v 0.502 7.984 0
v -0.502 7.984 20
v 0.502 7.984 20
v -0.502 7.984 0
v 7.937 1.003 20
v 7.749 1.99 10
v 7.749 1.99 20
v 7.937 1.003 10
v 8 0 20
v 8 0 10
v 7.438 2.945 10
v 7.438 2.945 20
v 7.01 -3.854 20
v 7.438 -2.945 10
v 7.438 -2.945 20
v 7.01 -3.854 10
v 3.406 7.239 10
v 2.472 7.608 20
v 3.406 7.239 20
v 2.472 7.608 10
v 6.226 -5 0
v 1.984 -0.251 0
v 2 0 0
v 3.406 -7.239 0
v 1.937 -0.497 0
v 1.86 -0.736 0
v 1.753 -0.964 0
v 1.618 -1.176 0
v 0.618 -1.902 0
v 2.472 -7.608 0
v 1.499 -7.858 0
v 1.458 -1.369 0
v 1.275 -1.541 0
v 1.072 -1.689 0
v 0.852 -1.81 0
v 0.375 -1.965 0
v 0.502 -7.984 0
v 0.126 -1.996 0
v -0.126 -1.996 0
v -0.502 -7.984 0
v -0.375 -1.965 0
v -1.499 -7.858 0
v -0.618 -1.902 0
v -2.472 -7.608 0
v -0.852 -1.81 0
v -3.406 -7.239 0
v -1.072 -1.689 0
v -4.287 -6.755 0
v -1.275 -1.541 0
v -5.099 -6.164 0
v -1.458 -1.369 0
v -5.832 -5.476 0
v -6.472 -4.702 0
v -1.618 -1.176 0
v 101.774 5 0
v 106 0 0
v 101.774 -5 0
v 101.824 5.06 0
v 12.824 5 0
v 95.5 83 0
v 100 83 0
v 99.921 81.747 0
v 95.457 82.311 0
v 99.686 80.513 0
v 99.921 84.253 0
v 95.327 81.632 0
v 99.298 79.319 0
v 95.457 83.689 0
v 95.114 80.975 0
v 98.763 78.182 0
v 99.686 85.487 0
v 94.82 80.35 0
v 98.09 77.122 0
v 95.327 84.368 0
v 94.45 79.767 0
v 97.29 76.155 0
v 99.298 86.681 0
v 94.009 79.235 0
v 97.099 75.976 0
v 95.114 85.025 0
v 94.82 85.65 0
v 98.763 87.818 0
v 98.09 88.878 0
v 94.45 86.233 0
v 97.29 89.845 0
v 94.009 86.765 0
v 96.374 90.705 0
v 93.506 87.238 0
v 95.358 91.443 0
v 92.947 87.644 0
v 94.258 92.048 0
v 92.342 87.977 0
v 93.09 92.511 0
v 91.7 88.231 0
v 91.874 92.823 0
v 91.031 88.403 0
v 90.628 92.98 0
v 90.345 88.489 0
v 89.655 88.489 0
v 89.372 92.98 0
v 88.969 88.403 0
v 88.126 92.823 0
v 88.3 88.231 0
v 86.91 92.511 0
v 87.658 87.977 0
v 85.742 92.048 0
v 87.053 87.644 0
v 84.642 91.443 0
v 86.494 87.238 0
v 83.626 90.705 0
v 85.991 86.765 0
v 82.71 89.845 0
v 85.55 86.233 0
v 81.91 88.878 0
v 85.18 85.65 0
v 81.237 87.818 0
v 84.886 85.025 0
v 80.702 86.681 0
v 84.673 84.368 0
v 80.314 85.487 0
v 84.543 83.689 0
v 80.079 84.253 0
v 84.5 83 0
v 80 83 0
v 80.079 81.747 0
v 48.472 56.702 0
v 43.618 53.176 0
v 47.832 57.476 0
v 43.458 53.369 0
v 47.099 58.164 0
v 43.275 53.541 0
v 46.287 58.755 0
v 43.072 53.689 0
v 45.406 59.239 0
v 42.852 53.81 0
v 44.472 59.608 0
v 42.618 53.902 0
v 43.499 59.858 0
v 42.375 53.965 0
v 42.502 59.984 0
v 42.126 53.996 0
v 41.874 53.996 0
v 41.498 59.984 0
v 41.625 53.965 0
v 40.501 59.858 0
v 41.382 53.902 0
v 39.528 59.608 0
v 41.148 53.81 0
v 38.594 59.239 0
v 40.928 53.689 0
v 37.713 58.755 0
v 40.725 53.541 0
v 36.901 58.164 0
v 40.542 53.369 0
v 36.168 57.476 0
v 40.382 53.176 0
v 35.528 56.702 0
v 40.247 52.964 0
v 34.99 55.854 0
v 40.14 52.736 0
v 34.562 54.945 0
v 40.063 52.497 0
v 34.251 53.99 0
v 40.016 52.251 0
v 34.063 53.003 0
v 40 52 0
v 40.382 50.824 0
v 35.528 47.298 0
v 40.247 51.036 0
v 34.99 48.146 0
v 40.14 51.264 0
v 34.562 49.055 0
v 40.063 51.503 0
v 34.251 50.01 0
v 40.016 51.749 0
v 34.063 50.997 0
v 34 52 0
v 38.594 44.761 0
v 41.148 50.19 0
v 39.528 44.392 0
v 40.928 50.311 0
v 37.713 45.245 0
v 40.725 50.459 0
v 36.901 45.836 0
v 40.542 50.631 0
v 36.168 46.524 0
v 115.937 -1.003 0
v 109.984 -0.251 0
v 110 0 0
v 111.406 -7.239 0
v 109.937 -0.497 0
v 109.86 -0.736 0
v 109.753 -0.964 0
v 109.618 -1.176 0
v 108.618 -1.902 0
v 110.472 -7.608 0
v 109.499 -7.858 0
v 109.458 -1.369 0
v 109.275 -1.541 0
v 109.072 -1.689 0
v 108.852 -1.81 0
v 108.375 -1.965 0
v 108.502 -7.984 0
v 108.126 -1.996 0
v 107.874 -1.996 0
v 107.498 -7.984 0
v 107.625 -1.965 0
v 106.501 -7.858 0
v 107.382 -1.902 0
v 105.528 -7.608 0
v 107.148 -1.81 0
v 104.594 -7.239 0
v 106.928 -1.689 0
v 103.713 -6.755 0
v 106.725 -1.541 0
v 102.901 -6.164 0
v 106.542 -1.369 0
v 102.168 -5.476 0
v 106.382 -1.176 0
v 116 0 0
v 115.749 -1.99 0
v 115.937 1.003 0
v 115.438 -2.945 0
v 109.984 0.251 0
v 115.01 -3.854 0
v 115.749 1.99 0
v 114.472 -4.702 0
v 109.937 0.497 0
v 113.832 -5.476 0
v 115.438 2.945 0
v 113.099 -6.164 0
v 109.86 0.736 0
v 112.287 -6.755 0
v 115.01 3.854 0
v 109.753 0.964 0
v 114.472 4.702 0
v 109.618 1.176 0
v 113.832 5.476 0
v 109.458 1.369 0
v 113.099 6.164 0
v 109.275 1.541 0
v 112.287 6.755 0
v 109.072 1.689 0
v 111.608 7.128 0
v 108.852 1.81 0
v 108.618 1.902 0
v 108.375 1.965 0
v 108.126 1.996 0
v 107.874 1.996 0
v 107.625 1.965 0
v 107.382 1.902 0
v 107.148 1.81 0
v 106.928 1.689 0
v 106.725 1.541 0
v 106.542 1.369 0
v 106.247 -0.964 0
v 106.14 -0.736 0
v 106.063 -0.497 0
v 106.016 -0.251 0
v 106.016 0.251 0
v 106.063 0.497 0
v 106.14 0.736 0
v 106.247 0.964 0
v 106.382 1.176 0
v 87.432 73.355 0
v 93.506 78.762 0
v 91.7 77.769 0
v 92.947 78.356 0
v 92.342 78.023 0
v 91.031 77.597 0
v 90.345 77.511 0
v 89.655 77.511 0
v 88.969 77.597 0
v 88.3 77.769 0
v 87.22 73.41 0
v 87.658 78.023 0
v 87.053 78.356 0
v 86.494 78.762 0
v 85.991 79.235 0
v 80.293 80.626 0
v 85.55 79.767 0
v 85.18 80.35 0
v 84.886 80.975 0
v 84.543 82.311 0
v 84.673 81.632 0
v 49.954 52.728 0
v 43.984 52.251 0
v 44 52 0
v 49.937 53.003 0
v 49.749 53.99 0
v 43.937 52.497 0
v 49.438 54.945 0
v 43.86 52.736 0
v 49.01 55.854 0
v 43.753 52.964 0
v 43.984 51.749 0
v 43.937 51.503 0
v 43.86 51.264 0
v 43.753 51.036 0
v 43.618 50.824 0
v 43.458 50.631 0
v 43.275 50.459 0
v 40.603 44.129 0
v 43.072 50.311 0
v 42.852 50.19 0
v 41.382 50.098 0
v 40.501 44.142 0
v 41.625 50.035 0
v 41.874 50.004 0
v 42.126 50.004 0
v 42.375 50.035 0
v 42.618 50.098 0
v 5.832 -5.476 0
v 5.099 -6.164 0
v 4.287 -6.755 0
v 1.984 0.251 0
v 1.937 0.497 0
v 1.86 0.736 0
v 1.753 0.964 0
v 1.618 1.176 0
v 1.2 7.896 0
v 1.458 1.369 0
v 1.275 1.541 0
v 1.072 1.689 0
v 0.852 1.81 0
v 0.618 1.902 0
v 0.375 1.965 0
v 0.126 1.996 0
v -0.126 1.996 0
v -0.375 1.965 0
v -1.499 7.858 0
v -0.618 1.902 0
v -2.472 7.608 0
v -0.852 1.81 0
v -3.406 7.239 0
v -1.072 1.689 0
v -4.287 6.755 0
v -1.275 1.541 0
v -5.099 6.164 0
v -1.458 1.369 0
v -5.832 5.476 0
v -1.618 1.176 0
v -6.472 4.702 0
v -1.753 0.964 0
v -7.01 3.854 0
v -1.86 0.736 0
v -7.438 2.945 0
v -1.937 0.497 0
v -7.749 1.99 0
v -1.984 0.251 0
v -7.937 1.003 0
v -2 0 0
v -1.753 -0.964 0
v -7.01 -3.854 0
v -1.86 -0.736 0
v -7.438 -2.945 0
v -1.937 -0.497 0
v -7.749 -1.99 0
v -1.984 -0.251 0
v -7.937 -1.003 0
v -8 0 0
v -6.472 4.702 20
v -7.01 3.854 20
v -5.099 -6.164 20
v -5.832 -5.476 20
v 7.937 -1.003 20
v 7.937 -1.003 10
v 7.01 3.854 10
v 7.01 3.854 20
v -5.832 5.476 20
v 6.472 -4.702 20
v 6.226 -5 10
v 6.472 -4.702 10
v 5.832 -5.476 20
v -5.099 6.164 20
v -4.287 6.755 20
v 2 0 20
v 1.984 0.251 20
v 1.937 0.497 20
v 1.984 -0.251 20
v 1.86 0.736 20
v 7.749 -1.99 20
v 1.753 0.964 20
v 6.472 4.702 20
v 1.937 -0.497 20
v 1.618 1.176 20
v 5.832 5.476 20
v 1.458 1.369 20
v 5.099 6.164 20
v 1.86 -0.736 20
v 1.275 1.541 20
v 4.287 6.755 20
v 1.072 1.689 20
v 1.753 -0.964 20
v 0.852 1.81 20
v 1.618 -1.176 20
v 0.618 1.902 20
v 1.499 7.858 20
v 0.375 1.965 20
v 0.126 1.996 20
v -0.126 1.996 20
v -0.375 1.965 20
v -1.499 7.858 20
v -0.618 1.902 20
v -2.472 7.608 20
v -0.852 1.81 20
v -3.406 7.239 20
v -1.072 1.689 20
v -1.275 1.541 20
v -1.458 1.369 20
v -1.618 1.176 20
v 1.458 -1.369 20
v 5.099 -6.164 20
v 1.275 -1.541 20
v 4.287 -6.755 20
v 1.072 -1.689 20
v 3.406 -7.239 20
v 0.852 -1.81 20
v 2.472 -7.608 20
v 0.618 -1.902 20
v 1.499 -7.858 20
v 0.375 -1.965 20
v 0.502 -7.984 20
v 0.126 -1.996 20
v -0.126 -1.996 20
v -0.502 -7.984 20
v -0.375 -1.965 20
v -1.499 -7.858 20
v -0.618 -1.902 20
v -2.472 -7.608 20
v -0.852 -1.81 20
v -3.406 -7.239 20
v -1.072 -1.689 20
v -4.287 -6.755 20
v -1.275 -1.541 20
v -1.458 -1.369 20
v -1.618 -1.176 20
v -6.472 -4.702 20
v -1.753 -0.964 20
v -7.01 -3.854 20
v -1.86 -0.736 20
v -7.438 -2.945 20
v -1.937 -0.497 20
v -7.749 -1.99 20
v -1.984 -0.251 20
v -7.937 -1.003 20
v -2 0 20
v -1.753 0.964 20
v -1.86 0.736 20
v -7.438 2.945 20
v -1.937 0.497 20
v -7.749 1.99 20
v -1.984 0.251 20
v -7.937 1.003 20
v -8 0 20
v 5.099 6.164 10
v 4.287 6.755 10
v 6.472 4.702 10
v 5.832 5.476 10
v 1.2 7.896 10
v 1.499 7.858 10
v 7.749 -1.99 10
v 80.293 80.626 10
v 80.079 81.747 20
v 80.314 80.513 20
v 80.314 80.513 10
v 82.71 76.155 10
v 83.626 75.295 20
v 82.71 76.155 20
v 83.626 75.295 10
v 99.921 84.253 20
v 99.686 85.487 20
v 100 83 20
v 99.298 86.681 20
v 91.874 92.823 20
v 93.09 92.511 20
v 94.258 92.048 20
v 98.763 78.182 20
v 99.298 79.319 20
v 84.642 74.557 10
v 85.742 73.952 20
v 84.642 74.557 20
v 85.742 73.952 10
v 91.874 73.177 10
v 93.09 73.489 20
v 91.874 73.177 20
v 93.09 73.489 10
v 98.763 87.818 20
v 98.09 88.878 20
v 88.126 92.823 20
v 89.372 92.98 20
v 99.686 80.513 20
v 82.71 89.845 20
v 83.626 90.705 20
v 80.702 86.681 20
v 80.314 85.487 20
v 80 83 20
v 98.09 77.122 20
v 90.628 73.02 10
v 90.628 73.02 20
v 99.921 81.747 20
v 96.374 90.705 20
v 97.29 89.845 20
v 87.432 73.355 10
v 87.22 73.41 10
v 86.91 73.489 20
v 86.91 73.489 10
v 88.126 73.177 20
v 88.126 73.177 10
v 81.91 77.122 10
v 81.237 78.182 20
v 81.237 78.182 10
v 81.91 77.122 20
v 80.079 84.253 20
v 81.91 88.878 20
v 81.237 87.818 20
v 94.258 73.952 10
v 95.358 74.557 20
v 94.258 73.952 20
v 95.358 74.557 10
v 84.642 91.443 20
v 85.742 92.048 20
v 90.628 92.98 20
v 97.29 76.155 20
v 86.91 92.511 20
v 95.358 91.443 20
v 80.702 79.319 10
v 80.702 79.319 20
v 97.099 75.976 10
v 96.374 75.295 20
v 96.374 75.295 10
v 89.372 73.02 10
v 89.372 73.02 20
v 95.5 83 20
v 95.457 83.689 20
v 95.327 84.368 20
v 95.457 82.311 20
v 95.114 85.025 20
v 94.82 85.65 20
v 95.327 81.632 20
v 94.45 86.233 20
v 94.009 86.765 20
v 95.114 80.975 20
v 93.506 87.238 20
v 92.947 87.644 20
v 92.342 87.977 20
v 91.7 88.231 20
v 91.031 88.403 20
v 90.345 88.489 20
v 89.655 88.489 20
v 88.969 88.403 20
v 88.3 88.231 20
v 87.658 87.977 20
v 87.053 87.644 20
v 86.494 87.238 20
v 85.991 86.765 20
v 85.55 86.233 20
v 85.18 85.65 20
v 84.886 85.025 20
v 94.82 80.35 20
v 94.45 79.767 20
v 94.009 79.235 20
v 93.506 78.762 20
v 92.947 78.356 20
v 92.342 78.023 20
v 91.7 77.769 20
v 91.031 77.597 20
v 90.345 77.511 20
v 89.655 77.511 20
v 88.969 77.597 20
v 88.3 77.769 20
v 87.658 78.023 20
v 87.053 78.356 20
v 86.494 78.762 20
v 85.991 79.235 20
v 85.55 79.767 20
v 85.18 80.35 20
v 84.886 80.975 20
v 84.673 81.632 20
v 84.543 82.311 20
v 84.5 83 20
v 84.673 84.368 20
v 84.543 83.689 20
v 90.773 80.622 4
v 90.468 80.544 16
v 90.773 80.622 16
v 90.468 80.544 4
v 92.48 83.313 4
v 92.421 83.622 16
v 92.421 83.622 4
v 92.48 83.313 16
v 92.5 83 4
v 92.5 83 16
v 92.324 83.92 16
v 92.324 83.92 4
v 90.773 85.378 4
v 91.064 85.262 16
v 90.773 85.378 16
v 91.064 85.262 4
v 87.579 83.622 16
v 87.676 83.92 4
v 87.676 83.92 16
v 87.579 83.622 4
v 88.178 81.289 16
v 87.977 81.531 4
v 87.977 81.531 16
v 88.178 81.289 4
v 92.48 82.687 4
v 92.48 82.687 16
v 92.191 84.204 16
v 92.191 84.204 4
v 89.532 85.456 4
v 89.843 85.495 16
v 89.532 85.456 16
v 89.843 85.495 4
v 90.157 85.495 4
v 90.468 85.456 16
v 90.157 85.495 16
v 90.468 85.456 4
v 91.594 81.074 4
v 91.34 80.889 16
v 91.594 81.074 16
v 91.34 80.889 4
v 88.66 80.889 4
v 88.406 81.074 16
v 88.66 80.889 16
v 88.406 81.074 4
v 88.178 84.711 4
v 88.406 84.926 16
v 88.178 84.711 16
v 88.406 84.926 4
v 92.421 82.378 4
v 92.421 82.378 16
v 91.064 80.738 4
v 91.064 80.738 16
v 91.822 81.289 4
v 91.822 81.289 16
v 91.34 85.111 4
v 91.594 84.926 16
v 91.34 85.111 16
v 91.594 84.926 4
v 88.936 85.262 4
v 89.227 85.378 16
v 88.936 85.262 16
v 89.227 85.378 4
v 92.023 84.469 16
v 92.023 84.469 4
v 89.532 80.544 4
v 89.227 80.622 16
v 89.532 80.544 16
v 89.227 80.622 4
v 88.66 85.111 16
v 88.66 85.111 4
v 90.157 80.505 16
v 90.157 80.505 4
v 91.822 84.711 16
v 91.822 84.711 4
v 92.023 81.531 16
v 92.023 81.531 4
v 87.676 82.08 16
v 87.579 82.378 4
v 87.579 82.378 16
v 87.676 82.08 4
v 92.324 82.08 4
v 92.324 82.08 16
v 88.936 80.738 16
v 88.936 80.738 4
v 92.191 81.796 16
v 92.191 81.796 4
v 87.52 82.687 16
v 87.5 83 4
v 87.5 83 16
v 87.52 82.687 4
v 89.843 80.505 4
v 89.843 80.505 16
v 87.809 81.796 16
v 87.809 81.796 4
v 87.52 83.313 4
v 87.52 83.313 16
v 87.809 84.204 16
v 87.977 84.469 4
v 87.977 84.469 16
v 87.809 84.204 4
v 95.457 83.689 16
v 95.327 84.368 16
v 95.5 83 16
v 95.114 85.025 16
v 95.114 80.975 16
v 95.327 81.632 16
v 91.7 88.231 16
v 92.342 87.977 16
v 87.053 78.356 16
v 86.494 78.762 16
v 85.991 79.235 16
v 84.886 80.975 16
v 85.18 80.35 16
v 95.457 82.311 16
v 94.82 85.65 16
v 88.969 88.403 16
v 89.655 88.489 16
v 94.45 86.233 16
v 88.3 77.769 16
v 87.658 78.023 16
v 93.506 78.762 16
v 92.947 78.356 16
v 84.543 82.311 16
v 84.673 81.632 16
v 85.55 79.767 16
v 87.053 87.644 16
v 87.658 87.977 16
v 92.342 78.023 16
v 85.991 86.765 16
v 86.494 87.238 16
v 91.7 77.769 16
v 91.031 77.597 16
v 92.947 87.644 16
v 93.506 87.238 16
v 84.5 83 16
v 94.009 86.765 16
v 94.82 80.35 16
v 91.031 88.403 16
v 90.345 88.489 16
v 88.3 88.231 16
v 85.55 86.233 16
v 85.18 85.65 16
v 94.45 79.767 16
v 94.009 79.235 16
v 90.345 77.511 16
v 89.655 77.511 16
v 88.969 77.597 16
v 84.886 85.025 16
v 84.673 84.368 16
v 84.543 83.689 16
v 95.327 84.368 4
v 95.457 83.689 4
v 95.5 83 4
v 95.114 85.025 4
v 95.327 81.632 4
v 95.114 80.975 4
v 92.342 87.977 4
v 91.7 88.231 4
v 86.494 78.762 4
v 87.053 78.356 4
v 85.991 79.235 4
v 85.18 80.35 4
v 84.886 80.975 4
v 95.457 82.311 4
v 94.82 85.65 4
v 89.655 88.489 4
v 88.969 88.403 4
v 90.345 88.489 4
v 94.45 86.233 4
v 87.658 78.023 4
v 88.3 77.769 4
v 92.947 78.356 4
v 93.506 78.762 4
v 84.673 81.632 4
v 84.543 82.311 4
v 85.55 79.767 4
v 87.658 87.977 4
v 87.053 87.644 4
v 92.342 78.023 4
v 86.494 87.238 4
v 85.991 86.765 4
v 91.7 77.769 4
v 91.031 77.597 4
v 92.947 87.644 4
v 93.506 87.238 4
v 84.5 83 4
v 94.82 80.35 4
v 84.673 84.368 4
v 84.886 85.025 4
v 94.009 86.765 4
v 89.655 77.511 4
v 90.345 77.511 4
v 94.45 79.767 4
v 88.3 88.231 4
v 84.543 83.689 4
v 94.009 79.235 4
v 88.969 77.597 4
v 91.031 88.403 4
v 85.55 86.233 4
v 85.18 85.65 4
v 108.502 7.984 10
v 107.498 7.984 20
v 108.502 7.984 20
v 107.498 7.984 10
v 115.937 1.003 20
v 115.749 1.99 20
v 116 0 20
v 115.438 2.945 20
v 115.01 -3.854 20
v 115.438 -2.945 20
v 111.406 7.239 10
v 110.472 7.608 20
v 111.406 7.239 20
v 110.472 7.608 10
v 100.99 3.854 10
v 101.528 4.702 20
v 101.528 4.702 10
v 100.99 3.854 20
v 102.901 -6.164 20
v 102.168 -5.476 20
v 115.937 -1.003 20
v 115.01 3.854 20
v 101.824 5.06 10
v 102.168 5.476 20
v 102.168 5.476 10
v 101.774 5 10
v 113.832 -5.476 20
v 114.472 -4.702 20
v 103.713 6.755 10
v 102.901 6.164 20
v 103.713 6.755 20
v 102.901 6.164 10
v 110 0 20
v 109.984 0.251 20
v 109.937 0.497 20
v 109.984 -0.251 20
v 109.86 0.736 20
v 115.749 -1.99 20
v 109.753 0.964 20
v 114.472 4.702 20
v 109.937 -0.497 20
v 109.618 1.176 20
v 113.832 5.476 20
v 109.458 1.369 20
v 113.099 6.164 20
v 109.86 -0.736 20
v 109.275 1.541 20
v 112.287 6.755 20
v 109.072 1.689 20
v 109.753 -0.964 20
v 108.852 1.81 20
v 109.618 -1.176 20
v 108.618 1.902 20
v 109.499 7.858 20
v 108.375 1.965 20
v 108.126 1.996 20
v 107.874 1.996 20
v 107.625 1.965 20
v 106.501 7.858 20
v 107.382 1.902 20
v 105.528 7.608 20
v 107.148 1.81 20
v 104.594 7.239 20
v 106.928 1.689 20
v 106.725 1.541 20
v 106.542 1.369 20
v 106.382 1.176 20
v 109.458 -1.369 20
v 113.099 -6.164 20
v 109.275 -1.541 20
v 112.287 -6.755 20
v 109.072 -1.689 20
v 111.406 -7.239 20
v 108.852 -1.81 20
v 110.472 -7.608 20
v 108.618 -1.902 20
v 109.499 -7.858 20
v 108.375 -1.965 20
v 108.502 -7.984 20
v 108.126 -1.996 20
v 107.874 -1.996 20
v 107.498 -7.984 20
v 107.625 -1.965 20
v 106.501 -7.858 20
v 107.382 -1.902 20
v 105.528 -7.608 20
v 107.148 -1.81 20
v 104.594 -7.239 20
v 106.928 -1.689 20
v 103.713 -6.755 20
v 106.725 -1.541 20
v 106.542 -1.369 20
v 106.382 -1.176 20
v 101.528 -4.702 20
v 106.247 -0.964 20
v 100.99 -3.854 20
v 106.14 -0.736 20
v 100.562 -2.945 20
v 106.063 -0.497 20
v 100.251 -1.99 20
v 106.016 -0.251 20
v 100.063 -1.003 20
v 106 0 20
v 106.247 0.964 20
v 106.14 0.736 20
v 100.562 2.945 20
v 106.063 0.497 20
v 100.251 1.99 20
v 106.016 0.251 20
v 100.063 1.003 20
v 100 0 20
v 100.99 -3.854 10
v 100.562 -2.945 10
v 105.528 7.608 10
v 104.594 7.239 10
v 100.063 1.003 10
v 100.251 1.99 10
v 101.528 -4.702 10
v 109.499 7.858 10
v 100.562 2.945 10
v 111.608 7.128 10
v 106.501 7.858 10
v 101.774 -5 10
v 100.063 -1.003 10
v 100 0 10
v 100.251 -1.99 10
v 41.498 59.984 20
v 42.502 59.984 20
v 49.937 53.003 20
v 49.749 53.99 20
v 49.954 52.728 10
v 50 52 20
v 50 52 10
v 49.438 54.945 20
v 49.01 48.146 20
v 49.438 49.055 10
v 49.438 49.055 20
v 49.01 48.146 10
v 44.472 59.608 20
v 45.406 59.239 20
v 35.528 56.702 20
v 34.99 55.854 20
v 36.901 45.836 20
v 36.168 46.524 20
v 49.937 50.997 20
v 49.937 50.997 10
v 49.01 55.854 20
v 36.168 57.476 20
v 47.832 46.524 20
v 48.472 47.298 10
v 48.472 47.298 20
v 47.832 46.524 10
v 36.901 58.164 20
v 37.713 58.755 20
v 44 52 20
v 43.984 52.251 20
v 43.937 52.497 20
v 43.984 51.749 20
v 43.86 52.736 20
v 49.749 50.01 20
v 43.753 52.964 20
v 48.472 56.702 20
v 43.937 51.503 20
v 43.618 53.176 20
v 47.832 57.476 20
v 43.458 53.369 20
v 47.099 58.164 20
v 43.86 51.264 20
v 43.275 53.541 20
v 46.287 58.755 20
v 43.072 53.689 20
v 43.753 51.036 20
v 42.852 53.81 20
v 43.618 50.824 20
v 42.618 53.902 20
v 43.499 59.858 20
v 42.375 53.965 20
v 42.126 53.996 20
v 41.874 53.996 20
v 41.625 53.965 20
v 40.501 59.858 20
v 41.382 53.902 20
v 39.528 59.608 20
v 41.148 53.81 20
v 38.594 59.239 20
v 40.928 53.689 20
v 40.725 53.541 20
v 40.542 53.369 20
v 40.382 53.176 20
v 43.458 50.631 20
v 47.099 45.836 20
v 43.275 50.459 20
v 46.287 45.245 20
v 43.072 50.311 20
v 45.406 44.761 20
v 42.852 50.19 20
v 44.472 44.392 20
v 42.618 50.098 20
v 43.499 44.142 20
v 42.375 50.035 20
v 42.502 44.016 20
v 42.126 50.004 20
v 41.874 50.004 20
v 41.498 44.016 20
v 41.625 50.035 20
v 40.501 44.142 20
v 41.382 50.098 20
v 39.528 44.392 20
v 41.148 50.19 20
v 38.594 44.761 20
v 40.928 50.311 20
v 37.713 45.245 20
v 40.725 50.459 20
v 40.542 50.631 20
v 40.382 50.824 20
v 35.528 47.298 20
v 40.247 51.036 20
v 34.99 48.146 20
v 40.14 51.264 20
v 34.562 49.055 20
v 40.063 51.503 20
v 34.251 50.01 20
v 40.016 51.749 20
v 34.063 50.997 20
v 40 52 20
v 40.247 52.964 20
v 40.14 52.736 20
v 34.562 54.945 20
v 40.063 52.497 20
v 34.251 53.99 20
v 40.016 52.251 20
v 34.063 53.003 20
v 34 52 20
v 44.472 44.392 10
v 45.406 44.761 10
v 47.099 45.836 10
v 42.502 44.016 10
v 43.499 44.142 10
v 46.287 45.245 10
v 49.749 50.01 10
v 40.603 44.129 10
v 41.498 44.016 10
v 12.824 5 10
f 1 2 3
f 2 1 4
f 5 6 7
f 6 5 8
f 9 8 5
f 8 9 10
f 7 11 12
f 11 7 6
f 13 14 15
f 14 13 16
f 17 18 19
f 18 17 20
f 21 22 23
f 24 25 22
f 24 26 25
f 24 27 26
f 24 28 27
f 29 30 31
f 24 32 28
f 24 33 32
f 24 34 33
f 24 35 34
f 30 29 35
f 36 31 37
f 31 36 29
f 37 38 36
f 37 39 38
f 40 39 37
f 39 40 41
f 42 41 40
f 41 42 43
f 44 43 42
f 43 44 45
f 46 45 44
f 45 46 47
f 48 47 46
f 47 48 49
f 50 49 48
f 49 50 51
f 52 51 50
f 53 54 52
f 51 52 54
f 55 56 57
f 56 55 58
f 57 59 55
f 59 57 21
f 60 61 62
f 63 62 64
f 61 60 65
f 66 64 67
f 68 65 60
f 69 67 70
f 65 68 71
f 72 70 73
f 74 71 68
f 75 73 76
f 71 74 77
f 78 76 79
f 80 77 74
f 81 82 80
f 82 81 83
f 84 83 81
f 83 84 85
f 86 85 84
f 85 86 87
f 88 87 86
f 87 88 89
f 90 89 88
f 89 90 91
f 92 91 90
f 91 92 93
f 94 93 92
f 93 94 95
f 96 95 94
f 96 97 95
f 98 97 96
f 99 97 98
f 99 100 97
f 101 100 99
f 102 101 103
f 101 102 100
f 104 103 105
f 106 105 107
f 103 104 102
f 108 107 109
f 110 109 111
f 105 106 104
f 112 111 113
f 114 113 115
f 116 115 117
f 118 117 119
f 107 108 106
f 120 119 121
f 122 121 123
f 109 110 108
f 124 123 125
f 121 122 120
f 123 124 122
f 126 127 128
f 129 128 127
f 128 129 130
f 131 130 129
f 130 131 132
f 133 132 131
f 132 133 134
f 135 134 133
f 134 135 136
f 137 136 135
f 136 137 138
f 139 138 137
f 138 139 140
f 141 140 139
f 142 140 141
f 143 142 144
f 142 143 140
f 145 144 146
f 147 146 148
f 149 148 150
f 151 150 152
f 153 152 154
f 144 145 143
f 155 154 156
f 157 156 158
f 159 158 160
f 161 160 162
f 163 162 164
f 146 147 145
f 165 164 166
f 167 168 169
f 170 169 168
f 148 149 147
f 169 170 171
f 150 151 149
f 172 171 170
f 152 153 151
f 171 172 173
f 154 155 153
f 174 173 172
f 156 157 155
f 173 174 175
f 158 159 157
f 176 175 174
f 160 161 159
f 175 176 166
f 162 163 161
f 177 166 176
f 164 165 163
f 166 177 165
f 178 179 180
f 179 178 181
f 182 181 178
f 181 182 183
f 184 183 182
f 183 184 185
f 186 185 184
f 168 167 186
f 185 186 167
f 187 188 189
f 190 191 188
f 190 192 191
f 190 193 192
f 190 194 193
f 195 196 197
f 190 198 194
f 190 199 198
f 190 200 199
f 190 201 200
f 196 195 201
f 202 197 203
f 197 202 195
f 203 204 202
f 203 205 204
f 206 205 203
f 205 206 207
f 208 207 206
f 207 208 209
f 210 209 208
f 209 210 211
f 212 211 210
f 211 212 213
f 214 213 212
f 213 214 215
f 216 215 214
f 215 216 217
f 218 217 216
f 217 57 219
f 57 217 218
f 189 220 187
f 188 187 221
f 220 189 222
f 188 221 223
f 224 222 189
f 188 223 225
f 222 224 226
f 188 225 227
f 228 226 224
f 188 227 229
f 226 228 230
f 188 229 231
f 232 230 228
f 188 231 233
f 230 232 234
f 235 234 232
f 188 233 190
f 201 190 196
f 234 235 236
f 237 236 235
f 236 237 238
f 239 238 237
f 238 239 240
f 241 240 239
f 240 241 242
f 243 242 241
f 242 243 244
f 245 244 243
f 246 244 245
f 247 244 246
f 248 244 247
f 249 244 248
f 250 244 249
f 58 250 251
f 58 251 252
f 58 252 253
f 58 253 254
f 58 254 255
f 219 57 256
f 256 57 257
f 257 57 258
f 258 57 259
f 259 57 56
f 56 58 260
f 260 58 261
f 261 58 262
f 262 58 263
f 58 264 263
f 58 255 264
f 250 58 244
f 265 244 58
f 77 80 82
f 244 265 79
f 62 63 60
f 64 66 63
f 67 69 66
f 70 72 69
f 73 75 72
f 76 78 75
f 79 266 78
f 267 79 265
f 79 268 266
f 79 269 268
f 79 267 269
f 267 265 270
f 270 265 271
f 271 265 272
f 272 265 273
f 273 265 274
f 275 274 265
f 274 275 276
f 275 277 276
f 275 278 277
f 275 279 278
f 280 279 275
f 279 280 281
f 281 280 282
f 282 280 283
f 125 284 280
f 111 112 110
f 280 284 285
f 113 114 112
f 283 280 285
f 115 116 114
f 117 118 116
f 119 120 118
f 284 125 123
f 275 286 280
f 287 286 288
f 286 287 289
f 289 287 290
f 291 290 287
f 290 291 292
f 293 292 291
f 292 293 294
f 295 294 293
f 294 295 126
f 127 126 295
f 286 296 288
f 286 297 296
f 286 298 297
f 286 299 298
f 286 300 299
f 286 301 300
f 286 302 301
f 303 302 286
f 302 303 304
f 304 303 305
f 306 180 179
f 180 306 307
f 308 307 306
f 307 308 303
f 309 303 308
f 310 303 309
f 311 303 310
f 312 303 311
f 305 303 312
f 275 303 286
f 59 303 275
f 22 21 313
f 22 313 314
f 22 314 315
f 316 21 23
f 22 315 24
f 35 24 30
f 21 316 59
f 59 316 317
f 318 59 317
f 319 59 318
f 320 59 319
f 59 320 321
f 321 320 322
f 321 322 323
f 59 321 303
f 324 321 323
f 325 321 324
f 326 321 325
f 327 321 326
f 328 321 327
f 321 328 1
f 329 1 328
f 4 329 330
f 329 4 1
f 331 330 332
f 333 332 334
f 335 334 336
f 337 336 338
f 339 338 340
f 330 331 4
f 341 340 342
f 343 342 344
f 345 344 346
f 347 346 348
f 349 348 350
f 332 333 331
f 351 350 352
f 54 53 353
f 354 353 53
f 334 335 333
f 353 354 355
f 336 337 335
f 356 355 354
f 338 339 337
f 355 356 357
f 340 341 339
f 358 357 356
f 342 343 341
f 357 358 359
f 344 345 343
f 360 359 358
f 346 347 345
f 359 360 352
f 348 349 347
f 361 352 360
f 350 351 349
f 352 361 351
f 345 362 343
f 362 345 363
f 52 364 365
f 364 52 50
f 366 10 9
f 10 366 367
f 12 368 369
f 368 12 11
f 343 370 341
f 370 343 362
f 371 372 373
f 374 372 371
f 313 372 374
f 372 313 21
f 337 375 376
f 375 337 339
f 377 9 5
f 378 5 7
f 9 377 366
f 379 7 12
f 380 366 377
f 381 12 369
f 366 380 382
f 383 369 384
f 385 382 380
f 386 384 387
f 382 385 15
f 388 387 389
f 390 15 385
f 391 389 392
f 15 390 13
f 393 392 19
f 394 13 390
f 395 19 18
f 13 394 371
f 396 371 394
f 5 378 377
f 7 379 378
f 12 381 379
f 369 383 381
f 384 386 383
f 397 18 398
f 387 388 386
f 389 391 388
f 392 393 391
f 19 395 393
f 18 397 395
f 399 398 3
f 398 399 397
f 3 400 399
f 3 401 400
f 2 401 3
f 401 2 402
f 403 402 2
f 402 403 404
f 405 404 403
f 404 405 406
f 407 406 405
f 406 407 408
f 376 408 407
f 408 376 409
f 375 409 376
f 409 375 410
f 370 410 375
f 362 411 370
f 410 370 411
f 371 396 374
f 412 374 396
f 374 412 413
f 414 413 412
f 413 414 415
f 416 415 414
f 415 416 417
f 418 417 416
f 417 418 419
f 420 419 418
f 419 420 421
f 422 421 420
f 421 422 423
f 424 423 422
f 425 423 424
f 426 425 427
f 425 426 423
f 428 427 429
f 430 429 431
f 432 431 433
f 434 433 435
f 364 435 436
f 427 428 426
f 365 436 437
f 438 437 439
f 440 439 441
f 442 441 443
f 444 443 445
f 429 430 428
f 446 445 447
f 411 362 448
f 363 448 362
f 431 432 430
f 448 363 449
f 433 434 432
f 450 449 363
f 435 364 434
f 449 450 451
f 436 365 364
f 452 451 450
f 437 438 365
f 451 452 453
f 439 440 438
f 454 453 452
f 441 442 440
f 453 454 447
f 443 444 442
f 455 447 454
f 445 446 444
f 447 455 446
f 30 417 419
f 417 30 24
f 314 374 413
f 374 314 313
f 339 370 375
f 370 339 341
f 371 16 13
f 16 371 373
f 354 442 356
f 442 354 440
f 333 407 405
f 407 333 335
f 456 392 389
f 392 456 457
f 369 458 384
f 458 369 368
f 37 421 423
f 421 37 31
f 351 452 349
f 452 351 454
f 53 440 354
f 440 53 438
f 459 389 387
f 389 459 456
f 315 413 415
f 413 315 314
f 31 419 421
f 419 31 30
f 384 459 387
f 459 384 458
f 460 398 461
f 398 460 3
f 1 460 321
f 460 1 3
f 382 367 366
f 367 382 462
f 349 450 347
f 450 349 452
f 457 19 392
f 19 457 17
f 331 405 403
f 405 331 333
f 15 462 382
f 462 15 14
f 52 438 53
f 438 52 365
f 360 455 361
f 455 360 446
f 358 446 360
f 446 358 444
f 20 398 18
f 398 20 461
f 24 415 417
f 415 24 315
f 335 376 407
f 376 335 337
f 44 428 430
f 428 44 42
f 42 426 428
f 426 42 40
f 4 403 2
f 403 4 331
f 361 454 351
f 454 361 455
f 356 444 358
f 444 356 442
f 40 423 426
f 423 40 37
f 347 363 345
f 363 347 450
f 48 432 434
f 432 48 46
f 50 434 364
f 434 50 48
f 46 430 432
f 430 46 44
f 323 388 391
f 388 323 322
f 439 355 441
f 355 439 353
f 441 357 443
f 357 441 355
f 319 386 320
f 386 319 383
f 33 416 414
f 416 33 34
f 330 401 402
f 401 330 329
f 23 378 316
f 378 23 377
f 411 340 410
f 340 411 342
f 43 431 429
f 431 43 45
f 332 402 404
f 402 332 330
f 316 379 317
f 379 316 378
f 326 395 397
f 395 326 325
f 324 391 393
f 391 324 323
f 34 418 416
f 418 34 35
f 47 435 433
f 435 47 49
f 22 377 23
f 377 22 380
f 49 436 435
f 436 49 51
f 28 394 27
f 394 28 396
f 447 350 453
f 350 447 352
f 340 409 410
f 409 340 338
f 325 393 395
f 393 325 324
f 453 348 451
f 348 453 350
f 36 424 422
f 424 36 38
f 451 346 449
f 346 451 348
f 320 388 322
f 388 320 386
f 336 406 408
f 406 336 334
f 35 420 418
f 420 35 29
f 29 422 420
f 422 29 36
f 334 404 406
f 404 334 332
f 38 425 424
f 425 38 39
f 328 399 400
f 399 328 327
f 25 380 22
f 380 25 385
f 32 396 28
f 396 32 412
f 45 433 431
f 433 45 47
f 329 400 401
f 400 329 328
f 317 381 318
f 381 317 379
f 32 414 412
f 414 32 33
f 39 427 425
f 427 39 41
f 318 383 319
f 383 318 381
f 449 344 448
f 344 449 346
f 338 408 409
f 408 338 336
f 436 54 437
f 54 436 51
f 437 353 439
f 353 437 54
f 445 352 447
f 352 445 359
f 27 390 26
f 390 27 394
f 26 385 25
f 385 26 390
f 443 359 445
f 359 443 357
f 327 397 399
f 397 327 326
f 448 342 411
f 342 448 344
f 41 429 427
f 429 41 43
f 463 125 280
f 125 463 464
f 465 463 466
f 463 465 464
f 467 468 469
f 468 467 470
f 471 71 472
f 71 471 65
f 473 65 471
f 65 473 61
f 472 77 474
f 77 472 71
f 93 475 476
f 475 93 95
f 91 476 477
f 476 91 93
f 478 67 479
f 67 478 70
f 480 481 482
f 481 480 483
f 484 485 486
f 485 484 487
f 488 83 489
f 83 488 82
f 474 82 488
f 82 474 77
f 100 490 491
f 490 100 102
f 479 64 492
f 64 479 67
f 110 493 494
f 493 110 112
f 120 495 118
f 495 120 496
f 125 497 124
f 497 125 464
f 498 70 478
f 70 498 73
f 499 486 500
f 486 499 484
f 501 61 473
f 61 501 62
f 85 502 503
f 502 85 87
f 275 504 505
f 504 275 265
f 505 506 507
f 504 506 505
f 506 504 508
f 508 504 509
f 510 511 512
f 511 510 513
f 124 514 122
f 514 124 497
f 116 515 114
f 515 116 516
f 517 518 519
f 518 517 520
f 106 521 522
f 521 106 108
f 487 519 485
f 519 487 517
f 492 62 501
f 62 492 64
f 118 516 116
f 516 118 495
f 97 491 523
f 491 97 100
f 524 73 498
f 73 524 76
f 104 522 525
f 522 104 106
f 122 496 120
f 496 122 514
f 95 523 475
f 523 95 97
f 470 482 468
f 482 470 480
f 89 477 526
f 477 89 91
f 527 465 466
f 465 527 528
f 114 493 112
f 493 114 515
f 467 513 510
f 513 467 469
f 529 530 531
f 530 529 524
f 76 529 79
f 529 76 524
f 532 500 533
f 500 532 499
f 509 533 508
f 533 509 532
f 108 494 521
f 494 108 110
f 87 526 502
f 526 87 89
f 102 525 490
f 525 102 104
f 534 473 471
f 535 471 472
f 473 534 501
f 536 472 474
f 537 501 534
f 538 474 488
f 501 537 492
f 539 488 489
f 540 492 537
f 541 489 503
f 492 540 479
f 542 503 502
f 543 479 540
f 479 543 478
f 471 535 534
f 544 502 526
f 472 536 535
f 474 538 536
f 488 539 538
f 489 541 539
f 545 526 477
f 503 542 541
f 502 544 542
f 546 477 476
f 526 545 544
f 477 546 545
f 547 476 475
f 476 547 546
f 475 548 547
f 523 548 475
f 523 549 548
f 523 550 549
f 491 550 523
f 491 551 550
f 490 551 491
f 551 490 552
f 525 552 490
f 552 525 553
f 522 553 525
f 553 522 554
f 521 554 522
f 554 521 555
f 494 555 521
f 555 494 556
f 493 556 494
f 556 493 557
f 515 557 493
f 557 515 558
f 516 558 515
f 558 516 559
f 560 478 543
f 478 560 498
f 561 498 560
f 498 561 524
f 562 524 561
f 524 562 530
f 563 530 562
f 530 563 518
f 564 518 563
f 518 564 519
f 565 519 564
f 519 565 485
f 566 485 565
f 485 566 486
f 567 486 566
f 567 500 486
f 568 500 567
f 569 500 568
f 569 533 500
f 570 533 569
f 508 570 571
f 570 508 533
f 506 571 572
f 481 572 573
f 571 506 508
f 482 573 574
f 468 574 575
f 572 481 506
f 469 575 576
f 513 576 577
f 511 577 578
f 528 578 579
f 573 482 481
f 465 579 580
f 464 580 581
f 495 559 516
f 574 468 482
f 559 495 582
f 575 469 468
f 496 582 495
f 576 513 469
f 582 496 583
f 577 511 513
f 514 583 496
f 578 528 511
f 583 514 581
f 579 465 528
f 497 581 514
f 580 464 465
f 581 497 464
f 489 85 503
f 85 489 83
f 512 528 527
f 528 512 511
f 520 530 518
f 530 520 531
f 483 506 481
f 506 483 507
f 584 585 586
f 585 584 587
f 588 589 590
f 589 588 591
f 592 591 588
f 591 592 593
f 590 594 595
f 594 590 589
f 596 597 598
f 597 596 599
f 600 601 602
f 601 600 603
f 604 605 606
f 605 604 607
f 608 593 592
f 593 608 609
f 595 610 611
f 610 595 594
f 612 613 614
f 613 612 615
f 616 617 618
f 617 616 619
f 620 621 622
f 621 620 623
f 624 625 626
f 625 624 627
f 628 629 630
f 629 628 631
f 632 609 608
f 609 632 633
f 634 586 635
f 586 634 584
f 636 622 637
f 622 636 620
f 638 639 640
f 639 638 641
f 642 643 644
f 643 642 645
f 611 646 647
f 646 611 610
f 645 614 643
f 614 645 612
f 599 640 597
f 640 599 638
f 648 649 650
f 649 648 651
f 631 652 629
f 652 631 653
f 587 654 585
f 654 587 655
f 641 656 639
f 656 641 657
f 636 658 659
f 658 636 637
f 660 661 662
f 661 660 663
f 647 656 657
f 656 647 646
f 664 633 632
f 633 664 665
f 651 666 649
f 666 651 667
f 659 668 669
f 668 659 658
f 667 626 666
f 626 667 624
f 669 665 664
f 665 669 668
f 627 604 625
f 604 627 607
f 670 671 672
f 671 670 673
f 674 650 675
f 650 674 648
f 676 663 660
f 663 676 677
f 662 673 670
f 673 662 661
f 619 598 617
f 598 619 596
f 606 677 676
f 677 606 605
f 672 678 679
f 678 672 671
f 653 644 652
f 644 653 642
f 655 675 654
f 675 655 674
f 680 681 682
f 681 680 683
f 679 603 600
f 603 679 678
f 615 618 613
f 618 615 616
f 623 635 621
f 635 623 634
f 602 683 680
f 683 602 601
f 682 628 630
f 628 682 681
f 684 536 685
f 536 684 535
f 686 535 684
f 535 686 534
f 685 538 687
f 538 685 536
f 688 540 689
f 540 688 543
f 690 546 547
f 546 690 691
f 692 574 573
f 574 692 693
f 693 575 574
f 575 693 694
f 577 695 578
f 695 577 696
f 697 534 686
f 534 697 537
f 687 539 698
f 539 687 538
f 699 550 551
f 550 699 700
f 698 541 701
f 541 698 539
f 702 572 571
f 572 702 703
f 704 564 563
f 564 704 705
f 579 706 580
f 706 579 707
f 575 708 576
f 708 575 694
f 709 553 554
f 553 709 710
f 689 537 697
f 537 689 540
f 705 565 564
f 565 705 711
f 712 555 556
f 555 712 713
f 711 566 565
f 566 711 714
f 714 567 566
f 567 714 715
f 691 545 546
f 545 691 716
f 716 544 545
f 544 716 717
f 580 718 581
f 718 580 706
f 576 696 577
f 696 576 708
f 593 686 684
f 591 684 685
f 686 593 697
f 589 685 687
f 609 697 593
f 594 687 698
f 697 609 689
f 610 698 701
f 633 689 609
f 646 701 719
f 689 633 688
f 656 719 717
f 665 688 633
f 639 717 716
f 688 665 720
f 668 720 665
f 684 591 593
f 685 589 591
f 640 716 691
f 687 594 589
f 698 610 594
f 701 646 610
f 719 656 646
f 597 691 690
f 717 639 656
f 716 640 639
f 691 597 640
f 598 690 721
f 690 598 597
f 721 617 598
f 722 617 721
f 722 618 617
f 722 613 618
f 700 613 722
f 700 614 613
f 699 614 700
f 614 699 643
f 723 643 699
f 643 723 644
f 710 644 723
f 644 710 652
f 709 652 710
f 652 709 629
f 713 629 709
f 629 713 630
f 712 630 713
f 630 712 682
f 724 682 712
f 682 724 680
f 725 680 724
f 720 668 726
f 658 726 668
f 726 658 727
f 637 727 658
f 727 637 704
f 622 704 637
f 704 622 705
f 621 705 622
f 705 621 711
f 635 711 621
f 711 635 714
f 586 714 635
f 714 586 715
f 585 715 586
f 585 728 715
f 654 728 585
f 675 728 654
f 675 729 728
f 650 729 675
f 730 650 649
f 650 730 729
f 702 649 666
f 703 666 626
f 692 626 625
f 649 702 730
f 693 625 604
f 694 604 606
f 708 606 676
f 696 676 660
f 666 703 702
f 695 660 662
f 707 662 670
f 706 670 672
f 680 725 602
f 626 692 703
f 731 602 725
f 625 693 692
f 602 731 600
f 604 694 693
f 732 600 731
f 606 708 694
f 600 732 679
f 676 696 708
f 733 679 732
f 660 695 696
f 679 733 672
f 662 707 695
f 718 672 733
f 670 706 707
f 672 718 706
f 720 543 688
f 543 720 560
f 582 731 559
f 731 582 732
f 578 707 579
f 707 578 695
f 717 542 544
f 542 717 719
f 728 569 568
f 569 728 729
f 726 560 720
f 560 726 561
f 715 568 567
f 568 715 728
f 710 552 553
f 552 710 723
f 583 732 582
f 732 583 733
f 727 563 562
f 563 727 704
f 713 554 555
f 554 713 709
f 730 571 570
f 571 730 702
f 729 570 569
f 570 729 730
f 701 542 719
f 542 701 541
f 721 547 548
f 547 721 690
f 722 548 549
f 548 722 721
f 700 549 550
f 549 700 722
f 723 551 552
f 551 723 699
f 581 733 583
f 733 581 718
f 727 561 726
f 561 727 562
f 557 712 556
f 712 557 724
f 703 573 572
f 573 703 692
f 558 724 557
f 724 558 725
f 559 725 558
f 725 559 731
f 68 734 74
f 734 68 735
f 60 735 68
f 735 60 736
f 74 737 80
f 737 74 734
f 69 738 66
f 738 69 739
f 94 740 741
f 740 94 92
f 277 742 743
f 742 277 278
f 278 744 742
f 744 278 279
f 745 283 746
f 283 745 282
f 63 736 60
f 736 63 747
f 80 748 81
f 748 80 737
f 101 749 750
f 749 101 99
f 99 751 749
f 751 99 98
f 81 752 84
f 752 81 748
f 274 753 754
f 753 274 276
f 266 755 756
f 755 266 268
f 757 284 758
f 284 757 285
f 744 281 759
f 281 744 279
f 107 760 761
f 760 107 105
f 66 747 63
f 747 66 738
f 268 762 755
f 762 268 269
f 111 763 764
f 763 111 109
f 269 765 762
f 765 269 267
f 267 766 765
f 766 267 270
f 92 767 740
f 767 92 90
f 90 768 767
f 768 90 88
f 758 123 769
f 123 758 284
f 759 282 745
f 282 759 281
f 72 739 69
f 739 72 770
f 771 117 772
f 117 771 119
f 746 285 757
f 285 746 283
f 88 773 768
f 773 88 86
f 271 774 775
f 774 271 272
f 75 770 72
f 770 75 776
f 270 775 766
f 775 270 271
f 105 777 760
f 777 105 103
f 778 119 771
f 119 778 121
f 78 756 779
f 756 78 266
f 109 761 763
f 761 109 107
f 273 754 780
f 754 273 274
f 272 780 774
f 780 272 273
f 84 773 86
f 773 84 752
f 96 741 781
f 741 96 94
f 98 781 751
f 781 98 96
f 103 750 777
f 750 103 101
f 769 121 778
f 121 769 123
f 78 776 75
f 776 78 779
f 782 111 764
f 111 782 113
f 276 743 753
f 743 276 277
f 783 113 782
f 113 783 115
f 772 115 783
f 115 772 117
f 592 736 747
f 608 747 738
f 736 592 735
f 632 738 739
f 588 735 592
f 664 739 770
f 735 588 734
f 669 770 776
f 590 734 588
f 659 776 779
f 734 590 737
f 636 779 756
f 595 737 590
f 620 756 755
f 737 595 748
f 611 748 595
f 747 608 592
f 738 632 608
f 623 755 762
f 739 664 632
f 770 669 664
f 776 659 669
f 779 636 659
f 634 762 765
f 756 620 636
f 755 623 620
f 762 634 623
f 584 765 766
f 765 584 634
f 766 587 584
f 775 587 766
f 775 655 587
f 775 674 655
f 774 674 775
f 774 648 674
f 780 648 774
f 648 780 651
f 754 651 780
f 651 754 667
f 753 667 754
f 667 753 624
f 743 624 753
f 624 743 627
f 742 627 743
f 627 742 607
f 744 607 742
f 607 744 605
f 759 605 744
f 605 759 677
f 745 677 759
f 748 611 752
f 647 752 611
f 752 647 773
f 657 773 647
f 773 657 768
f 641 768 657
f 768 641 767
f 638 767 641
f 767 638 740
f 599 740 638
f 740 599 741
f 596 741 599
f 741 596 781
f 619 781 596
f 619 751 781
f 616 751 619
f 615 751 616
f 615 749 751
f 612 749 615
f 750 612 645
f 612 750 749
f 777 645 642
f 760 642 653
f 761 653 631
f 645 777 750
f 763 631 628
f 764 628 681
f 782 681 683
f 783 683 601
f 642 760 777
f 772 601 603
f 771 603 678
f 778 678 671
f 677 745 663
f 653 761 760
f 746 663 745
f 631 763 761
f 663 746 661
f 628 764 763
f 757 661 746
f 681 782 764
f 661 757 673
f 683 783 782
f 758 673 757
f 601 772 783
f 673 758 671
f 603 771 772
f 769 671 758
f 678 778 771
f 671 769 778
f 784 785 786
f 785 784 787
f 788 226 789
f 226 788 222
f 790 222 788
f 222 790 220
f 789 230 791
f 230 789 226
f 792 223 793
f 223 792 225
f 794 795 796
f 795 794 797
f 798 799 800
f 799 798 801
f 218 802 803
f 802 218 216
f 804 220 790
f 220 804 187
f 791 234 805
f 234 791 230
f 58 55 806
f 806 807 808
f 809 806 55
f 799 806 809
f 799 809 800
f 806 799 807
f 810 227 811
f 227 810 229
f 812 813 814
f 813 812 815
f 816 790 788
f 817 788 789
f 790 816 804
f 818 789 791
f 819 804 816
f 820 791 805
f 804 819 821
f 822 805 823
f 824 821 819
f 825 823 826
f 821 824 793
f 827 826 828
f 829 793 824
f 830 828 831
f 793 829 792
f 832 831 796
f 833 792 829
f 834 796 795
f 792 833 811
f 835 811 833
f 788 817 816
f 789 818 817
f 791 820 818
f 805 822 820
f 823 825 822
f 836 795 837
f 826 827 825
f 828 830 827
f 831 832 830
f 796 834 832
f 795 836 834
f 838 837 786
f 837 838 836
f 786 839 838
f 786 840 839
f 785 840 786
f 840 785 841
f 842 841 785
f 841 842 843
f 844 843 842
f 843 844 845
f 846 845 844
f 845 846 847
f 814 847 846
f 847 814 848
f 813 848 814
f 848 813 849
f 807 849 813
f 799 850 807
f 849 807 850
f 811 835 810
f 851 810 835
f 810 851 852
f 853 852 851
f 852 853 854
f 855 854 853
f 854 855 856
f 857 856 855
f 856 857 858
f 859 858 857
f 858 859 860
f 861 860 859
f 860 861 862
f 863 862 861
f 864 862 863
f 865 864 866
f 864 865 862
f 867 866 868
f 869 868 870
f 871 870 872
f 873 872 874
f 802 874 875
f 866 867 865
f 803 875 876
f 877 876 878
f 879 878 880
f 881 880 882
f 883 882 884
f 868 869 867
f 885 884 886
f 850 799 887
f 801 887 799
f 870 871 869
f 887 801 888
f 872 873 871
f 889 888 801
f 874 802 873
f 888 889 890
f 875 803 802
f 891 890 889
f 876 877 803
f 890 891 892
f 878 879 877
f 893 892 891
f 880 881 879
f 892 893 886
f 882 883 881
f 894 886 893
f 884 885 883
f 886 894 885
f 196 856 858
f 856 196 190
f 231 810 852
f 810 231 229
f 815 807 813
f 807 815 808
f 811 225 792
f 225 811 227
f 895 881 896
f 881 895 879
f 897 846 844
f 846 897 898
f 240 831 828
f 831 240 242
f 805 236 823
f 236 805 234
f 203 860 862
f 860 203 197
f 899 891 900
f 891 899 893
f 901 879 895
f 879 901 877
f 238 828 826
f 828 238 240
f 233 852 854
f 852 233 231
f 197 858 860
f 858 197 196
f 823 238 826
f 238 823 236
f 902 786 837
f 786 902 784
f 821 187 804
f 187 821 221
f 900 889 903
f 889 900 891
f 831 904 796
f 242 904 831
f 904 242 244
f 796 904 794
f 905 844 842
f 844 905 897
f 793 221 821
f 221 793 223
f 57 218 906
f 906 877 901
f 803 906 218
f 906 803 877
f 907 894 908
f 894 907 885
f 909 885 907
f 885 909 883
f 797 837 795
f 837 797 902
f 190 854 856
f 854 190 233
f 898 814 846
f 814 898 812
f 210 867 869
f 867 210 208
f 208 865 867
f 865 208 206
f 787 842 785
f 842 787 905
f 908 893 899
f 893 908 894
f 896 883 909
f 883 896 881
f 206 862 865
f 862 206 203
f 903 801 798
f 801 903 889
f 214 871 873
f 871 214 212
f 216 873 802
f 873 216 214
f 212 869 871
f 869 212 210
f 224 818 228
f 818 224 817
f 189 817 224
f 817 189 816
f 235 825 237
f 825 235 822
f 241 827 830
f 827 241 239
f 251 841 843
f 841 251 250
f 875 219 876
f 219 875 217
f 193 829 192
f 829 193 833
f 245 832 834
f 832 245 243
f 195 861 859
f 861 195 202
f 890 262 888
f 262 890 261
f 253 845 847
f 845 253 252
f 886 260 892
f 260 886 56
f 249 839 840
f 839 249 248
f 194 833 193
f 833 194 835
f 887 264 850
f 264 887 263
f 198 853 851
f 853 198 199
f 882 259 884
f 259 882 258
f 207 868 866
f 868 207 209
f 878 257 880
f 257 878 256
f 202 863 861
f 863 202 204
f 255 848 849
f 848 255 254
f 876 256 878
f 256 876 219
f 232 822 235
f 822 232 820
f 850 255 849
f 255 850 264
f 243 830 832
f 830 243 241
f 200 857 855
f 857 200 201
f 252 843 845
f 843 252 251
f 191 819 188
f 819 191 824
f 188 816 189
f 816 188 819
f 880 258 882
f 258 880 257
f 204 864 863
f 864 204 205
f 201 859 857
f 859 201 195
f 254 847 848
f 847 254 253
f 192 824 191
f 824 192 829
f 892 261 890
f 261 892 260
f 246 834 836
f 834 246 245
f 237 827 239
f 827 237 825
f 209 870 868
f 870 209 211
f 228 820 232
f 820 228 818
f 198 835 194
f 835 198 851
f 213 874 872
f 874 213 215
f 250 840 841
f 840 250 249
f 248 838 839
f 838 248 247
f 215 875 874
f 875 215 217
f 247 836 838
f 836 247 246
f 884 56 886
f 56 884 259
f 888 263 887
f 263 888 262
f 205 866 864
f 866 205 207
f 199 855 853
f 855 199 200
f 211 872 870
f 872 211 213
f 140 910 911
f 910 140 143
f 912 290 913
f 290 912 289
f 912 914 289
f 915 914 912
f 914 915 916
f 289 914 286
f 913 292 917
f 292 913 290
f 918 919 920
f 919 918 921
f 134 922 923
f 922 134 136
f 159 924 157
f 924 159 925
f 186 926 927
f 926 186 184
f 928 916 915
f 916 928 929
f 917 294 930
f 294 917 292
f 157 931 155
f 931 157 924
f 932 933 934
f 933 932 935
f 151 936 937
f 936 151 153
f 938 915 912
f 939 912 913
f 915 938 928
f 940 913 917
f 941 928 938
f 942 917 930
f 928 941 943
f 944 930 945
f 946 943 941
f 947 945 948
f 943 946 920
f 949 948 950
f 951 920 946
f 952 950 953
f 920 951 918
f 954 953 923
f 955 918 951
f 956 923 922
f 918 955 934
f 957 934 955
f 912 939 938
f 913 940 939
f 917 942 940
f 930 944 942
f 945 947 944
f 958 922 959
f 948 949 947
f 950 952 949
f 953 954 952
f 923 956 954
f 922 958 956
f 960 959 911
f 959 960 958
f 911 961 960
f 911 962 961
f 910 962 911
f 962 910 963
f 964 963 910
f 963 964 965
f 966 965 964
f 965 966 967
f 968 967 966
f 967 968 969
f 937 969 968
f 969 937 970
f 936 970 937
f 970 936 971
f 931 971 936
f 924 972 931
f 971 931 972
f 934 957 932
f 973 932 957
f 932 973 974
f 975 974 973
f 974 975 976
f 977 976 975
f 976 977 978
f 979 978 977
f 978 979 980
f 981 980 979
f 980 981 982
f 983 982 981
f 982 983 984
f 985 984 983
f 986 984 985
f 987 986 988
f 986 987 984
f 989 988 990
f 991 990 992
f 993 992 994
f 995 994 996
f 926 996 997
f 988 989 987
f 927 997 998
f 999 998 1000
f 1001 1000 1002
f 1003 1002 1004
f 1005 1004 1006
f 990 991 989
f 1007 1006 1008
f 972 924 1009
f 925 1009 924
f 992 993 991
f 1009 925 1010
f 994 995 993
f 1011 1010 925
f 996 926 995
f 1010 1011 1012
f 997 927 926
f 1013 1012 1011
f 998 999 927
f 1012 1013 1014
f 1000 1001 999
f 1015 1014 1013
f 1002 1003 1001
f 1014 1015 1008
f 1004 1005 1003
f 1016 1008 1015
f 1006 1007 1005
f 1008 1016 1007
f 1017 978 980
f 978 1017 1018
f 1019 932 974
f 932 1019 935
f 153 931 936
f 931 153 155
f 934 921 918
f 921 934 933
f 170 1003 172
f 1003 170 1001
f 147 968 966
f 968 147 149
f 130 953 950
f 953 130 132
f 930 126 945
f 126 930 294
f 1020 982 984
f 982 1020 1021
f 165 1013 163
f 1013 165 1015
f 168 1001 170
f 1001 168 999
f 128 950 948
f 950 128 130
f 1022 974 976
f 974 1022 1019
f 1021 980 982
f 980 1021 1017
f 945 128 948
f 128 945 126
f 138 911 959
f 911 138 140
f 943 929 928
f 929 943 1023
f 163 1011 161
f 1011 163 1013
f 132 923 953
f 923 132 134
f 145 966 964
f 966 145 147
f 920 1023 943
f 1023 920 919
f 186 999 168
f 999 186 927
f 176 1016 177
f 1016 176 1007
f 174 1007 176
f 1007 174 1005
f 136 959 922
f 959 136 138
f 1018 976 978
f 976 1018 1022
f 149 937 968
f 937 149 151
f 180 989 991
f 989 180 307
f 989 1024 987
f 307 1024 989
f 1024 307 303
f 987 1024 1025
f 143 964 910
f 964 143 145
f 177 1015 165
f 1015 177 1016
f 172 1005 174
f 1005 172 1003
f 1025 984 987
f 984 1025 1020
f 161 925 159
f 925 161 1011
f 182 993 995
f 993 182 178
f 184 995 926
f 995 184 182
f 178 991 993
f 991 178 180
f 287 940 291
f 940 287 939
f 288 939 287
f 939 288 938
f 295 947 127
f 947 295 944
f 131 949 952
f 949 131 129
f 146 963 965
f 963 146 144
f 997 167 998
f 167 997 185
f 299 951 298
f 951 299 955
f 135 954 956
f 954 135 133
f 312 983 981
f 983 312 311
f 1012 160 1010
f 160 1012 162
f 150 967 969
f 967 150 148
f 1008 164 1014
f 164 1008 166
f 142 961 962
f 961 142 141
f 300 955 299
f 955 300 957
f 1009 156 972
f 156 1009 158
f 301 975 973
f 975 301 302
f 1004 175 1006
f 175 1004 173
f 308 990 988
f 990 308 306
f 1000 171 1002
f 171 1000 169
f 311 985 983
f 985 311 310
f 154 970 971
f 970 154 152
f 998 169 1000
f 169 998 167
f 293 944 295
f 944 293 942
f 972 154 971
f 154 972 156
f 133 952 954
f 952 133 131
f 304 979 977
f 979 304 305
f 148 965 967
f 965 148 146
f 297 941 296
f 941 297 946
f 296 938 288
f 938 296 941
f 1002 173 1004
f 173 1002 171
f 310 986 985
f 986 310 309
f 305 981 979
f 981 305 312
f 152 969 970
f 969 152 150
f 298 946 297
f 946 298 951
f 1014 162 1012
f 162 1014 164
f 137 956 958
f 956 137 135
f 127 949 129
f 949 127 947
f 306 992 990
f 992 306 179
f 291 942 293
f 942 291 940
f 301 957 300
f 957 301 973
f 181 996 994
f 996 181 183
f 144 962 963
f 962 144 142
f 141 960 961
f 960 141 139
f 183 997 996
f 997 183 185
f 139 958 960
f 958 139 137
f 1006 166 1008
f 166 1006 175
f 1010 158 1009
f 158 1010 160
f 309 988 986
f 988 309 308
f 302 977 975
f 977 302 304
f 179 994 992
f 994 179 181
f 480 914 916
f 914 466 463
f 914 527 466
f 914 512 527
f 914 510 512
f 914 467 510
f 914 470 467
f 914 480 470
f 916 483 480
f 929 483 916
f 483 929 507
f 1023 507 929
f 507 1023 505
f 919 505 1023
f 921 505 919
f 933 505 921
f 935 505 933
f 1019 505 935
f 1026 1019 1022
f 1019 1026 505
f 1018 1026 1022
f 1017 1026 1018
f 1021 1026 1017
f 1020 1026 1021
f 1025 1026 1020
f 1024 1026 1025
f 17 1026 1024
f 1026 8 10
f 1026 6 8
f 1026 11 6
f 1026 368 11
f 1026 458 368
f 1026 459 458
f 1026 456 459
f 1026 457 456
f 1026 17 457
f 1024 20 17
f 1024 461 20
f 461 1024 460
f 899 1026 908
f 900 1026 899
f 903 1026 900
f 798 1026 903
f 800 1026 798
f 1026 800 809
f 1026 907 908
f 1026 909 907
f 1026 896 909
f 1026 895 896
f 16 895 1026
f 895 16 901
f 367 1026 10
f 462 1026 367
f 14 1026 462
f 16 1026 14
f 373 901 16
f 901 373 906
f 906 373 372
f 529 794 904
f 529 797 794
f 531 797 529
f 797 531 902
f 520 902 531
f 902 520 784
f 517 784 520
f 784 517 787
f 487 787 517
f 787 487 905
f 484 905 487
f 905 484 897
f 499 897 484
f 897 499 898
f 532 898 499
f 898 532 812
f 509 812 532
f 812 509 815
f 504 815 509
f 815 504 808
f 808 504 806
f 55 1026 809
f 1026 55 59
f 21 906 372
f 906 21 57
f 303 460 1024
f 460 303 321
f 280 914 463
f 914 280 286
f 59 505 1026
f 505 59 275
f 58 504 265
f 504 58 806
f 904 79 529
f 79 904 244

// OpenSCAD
$fn=50;

difference(){
cylinder(d=16,h=20);
translate([0,0,-1])cylinder(d=4,h=30);
}
translate([90,83,0])
difference(){
cylinder(d=20,h=20);
translate([0,0,-1])cylinder(d=5,h=30);
translate([0,0,16])cylinder(d=11,h=10);
cylinder(d=11,h=4); 
}
translate([108,0,0])
difference(){
cylinder(d=16,h=20);
translate([0,0,-1])cylinder(d=4,h=30);
}
translate([42,52,0])
difference(){
cylinder(d=16,h=20);
translate([0,0,-1])cylinder(d=4,h=30);
}

translate([3,-5,0])cube([102,10,10]);

rotate([0,0,42.6])
translate([3,-5,0])cube([113,10,10]);

translate([108,0,0])rotate([0,0,101.9])
translate([3,-5,0])cube([76,10,10]);
